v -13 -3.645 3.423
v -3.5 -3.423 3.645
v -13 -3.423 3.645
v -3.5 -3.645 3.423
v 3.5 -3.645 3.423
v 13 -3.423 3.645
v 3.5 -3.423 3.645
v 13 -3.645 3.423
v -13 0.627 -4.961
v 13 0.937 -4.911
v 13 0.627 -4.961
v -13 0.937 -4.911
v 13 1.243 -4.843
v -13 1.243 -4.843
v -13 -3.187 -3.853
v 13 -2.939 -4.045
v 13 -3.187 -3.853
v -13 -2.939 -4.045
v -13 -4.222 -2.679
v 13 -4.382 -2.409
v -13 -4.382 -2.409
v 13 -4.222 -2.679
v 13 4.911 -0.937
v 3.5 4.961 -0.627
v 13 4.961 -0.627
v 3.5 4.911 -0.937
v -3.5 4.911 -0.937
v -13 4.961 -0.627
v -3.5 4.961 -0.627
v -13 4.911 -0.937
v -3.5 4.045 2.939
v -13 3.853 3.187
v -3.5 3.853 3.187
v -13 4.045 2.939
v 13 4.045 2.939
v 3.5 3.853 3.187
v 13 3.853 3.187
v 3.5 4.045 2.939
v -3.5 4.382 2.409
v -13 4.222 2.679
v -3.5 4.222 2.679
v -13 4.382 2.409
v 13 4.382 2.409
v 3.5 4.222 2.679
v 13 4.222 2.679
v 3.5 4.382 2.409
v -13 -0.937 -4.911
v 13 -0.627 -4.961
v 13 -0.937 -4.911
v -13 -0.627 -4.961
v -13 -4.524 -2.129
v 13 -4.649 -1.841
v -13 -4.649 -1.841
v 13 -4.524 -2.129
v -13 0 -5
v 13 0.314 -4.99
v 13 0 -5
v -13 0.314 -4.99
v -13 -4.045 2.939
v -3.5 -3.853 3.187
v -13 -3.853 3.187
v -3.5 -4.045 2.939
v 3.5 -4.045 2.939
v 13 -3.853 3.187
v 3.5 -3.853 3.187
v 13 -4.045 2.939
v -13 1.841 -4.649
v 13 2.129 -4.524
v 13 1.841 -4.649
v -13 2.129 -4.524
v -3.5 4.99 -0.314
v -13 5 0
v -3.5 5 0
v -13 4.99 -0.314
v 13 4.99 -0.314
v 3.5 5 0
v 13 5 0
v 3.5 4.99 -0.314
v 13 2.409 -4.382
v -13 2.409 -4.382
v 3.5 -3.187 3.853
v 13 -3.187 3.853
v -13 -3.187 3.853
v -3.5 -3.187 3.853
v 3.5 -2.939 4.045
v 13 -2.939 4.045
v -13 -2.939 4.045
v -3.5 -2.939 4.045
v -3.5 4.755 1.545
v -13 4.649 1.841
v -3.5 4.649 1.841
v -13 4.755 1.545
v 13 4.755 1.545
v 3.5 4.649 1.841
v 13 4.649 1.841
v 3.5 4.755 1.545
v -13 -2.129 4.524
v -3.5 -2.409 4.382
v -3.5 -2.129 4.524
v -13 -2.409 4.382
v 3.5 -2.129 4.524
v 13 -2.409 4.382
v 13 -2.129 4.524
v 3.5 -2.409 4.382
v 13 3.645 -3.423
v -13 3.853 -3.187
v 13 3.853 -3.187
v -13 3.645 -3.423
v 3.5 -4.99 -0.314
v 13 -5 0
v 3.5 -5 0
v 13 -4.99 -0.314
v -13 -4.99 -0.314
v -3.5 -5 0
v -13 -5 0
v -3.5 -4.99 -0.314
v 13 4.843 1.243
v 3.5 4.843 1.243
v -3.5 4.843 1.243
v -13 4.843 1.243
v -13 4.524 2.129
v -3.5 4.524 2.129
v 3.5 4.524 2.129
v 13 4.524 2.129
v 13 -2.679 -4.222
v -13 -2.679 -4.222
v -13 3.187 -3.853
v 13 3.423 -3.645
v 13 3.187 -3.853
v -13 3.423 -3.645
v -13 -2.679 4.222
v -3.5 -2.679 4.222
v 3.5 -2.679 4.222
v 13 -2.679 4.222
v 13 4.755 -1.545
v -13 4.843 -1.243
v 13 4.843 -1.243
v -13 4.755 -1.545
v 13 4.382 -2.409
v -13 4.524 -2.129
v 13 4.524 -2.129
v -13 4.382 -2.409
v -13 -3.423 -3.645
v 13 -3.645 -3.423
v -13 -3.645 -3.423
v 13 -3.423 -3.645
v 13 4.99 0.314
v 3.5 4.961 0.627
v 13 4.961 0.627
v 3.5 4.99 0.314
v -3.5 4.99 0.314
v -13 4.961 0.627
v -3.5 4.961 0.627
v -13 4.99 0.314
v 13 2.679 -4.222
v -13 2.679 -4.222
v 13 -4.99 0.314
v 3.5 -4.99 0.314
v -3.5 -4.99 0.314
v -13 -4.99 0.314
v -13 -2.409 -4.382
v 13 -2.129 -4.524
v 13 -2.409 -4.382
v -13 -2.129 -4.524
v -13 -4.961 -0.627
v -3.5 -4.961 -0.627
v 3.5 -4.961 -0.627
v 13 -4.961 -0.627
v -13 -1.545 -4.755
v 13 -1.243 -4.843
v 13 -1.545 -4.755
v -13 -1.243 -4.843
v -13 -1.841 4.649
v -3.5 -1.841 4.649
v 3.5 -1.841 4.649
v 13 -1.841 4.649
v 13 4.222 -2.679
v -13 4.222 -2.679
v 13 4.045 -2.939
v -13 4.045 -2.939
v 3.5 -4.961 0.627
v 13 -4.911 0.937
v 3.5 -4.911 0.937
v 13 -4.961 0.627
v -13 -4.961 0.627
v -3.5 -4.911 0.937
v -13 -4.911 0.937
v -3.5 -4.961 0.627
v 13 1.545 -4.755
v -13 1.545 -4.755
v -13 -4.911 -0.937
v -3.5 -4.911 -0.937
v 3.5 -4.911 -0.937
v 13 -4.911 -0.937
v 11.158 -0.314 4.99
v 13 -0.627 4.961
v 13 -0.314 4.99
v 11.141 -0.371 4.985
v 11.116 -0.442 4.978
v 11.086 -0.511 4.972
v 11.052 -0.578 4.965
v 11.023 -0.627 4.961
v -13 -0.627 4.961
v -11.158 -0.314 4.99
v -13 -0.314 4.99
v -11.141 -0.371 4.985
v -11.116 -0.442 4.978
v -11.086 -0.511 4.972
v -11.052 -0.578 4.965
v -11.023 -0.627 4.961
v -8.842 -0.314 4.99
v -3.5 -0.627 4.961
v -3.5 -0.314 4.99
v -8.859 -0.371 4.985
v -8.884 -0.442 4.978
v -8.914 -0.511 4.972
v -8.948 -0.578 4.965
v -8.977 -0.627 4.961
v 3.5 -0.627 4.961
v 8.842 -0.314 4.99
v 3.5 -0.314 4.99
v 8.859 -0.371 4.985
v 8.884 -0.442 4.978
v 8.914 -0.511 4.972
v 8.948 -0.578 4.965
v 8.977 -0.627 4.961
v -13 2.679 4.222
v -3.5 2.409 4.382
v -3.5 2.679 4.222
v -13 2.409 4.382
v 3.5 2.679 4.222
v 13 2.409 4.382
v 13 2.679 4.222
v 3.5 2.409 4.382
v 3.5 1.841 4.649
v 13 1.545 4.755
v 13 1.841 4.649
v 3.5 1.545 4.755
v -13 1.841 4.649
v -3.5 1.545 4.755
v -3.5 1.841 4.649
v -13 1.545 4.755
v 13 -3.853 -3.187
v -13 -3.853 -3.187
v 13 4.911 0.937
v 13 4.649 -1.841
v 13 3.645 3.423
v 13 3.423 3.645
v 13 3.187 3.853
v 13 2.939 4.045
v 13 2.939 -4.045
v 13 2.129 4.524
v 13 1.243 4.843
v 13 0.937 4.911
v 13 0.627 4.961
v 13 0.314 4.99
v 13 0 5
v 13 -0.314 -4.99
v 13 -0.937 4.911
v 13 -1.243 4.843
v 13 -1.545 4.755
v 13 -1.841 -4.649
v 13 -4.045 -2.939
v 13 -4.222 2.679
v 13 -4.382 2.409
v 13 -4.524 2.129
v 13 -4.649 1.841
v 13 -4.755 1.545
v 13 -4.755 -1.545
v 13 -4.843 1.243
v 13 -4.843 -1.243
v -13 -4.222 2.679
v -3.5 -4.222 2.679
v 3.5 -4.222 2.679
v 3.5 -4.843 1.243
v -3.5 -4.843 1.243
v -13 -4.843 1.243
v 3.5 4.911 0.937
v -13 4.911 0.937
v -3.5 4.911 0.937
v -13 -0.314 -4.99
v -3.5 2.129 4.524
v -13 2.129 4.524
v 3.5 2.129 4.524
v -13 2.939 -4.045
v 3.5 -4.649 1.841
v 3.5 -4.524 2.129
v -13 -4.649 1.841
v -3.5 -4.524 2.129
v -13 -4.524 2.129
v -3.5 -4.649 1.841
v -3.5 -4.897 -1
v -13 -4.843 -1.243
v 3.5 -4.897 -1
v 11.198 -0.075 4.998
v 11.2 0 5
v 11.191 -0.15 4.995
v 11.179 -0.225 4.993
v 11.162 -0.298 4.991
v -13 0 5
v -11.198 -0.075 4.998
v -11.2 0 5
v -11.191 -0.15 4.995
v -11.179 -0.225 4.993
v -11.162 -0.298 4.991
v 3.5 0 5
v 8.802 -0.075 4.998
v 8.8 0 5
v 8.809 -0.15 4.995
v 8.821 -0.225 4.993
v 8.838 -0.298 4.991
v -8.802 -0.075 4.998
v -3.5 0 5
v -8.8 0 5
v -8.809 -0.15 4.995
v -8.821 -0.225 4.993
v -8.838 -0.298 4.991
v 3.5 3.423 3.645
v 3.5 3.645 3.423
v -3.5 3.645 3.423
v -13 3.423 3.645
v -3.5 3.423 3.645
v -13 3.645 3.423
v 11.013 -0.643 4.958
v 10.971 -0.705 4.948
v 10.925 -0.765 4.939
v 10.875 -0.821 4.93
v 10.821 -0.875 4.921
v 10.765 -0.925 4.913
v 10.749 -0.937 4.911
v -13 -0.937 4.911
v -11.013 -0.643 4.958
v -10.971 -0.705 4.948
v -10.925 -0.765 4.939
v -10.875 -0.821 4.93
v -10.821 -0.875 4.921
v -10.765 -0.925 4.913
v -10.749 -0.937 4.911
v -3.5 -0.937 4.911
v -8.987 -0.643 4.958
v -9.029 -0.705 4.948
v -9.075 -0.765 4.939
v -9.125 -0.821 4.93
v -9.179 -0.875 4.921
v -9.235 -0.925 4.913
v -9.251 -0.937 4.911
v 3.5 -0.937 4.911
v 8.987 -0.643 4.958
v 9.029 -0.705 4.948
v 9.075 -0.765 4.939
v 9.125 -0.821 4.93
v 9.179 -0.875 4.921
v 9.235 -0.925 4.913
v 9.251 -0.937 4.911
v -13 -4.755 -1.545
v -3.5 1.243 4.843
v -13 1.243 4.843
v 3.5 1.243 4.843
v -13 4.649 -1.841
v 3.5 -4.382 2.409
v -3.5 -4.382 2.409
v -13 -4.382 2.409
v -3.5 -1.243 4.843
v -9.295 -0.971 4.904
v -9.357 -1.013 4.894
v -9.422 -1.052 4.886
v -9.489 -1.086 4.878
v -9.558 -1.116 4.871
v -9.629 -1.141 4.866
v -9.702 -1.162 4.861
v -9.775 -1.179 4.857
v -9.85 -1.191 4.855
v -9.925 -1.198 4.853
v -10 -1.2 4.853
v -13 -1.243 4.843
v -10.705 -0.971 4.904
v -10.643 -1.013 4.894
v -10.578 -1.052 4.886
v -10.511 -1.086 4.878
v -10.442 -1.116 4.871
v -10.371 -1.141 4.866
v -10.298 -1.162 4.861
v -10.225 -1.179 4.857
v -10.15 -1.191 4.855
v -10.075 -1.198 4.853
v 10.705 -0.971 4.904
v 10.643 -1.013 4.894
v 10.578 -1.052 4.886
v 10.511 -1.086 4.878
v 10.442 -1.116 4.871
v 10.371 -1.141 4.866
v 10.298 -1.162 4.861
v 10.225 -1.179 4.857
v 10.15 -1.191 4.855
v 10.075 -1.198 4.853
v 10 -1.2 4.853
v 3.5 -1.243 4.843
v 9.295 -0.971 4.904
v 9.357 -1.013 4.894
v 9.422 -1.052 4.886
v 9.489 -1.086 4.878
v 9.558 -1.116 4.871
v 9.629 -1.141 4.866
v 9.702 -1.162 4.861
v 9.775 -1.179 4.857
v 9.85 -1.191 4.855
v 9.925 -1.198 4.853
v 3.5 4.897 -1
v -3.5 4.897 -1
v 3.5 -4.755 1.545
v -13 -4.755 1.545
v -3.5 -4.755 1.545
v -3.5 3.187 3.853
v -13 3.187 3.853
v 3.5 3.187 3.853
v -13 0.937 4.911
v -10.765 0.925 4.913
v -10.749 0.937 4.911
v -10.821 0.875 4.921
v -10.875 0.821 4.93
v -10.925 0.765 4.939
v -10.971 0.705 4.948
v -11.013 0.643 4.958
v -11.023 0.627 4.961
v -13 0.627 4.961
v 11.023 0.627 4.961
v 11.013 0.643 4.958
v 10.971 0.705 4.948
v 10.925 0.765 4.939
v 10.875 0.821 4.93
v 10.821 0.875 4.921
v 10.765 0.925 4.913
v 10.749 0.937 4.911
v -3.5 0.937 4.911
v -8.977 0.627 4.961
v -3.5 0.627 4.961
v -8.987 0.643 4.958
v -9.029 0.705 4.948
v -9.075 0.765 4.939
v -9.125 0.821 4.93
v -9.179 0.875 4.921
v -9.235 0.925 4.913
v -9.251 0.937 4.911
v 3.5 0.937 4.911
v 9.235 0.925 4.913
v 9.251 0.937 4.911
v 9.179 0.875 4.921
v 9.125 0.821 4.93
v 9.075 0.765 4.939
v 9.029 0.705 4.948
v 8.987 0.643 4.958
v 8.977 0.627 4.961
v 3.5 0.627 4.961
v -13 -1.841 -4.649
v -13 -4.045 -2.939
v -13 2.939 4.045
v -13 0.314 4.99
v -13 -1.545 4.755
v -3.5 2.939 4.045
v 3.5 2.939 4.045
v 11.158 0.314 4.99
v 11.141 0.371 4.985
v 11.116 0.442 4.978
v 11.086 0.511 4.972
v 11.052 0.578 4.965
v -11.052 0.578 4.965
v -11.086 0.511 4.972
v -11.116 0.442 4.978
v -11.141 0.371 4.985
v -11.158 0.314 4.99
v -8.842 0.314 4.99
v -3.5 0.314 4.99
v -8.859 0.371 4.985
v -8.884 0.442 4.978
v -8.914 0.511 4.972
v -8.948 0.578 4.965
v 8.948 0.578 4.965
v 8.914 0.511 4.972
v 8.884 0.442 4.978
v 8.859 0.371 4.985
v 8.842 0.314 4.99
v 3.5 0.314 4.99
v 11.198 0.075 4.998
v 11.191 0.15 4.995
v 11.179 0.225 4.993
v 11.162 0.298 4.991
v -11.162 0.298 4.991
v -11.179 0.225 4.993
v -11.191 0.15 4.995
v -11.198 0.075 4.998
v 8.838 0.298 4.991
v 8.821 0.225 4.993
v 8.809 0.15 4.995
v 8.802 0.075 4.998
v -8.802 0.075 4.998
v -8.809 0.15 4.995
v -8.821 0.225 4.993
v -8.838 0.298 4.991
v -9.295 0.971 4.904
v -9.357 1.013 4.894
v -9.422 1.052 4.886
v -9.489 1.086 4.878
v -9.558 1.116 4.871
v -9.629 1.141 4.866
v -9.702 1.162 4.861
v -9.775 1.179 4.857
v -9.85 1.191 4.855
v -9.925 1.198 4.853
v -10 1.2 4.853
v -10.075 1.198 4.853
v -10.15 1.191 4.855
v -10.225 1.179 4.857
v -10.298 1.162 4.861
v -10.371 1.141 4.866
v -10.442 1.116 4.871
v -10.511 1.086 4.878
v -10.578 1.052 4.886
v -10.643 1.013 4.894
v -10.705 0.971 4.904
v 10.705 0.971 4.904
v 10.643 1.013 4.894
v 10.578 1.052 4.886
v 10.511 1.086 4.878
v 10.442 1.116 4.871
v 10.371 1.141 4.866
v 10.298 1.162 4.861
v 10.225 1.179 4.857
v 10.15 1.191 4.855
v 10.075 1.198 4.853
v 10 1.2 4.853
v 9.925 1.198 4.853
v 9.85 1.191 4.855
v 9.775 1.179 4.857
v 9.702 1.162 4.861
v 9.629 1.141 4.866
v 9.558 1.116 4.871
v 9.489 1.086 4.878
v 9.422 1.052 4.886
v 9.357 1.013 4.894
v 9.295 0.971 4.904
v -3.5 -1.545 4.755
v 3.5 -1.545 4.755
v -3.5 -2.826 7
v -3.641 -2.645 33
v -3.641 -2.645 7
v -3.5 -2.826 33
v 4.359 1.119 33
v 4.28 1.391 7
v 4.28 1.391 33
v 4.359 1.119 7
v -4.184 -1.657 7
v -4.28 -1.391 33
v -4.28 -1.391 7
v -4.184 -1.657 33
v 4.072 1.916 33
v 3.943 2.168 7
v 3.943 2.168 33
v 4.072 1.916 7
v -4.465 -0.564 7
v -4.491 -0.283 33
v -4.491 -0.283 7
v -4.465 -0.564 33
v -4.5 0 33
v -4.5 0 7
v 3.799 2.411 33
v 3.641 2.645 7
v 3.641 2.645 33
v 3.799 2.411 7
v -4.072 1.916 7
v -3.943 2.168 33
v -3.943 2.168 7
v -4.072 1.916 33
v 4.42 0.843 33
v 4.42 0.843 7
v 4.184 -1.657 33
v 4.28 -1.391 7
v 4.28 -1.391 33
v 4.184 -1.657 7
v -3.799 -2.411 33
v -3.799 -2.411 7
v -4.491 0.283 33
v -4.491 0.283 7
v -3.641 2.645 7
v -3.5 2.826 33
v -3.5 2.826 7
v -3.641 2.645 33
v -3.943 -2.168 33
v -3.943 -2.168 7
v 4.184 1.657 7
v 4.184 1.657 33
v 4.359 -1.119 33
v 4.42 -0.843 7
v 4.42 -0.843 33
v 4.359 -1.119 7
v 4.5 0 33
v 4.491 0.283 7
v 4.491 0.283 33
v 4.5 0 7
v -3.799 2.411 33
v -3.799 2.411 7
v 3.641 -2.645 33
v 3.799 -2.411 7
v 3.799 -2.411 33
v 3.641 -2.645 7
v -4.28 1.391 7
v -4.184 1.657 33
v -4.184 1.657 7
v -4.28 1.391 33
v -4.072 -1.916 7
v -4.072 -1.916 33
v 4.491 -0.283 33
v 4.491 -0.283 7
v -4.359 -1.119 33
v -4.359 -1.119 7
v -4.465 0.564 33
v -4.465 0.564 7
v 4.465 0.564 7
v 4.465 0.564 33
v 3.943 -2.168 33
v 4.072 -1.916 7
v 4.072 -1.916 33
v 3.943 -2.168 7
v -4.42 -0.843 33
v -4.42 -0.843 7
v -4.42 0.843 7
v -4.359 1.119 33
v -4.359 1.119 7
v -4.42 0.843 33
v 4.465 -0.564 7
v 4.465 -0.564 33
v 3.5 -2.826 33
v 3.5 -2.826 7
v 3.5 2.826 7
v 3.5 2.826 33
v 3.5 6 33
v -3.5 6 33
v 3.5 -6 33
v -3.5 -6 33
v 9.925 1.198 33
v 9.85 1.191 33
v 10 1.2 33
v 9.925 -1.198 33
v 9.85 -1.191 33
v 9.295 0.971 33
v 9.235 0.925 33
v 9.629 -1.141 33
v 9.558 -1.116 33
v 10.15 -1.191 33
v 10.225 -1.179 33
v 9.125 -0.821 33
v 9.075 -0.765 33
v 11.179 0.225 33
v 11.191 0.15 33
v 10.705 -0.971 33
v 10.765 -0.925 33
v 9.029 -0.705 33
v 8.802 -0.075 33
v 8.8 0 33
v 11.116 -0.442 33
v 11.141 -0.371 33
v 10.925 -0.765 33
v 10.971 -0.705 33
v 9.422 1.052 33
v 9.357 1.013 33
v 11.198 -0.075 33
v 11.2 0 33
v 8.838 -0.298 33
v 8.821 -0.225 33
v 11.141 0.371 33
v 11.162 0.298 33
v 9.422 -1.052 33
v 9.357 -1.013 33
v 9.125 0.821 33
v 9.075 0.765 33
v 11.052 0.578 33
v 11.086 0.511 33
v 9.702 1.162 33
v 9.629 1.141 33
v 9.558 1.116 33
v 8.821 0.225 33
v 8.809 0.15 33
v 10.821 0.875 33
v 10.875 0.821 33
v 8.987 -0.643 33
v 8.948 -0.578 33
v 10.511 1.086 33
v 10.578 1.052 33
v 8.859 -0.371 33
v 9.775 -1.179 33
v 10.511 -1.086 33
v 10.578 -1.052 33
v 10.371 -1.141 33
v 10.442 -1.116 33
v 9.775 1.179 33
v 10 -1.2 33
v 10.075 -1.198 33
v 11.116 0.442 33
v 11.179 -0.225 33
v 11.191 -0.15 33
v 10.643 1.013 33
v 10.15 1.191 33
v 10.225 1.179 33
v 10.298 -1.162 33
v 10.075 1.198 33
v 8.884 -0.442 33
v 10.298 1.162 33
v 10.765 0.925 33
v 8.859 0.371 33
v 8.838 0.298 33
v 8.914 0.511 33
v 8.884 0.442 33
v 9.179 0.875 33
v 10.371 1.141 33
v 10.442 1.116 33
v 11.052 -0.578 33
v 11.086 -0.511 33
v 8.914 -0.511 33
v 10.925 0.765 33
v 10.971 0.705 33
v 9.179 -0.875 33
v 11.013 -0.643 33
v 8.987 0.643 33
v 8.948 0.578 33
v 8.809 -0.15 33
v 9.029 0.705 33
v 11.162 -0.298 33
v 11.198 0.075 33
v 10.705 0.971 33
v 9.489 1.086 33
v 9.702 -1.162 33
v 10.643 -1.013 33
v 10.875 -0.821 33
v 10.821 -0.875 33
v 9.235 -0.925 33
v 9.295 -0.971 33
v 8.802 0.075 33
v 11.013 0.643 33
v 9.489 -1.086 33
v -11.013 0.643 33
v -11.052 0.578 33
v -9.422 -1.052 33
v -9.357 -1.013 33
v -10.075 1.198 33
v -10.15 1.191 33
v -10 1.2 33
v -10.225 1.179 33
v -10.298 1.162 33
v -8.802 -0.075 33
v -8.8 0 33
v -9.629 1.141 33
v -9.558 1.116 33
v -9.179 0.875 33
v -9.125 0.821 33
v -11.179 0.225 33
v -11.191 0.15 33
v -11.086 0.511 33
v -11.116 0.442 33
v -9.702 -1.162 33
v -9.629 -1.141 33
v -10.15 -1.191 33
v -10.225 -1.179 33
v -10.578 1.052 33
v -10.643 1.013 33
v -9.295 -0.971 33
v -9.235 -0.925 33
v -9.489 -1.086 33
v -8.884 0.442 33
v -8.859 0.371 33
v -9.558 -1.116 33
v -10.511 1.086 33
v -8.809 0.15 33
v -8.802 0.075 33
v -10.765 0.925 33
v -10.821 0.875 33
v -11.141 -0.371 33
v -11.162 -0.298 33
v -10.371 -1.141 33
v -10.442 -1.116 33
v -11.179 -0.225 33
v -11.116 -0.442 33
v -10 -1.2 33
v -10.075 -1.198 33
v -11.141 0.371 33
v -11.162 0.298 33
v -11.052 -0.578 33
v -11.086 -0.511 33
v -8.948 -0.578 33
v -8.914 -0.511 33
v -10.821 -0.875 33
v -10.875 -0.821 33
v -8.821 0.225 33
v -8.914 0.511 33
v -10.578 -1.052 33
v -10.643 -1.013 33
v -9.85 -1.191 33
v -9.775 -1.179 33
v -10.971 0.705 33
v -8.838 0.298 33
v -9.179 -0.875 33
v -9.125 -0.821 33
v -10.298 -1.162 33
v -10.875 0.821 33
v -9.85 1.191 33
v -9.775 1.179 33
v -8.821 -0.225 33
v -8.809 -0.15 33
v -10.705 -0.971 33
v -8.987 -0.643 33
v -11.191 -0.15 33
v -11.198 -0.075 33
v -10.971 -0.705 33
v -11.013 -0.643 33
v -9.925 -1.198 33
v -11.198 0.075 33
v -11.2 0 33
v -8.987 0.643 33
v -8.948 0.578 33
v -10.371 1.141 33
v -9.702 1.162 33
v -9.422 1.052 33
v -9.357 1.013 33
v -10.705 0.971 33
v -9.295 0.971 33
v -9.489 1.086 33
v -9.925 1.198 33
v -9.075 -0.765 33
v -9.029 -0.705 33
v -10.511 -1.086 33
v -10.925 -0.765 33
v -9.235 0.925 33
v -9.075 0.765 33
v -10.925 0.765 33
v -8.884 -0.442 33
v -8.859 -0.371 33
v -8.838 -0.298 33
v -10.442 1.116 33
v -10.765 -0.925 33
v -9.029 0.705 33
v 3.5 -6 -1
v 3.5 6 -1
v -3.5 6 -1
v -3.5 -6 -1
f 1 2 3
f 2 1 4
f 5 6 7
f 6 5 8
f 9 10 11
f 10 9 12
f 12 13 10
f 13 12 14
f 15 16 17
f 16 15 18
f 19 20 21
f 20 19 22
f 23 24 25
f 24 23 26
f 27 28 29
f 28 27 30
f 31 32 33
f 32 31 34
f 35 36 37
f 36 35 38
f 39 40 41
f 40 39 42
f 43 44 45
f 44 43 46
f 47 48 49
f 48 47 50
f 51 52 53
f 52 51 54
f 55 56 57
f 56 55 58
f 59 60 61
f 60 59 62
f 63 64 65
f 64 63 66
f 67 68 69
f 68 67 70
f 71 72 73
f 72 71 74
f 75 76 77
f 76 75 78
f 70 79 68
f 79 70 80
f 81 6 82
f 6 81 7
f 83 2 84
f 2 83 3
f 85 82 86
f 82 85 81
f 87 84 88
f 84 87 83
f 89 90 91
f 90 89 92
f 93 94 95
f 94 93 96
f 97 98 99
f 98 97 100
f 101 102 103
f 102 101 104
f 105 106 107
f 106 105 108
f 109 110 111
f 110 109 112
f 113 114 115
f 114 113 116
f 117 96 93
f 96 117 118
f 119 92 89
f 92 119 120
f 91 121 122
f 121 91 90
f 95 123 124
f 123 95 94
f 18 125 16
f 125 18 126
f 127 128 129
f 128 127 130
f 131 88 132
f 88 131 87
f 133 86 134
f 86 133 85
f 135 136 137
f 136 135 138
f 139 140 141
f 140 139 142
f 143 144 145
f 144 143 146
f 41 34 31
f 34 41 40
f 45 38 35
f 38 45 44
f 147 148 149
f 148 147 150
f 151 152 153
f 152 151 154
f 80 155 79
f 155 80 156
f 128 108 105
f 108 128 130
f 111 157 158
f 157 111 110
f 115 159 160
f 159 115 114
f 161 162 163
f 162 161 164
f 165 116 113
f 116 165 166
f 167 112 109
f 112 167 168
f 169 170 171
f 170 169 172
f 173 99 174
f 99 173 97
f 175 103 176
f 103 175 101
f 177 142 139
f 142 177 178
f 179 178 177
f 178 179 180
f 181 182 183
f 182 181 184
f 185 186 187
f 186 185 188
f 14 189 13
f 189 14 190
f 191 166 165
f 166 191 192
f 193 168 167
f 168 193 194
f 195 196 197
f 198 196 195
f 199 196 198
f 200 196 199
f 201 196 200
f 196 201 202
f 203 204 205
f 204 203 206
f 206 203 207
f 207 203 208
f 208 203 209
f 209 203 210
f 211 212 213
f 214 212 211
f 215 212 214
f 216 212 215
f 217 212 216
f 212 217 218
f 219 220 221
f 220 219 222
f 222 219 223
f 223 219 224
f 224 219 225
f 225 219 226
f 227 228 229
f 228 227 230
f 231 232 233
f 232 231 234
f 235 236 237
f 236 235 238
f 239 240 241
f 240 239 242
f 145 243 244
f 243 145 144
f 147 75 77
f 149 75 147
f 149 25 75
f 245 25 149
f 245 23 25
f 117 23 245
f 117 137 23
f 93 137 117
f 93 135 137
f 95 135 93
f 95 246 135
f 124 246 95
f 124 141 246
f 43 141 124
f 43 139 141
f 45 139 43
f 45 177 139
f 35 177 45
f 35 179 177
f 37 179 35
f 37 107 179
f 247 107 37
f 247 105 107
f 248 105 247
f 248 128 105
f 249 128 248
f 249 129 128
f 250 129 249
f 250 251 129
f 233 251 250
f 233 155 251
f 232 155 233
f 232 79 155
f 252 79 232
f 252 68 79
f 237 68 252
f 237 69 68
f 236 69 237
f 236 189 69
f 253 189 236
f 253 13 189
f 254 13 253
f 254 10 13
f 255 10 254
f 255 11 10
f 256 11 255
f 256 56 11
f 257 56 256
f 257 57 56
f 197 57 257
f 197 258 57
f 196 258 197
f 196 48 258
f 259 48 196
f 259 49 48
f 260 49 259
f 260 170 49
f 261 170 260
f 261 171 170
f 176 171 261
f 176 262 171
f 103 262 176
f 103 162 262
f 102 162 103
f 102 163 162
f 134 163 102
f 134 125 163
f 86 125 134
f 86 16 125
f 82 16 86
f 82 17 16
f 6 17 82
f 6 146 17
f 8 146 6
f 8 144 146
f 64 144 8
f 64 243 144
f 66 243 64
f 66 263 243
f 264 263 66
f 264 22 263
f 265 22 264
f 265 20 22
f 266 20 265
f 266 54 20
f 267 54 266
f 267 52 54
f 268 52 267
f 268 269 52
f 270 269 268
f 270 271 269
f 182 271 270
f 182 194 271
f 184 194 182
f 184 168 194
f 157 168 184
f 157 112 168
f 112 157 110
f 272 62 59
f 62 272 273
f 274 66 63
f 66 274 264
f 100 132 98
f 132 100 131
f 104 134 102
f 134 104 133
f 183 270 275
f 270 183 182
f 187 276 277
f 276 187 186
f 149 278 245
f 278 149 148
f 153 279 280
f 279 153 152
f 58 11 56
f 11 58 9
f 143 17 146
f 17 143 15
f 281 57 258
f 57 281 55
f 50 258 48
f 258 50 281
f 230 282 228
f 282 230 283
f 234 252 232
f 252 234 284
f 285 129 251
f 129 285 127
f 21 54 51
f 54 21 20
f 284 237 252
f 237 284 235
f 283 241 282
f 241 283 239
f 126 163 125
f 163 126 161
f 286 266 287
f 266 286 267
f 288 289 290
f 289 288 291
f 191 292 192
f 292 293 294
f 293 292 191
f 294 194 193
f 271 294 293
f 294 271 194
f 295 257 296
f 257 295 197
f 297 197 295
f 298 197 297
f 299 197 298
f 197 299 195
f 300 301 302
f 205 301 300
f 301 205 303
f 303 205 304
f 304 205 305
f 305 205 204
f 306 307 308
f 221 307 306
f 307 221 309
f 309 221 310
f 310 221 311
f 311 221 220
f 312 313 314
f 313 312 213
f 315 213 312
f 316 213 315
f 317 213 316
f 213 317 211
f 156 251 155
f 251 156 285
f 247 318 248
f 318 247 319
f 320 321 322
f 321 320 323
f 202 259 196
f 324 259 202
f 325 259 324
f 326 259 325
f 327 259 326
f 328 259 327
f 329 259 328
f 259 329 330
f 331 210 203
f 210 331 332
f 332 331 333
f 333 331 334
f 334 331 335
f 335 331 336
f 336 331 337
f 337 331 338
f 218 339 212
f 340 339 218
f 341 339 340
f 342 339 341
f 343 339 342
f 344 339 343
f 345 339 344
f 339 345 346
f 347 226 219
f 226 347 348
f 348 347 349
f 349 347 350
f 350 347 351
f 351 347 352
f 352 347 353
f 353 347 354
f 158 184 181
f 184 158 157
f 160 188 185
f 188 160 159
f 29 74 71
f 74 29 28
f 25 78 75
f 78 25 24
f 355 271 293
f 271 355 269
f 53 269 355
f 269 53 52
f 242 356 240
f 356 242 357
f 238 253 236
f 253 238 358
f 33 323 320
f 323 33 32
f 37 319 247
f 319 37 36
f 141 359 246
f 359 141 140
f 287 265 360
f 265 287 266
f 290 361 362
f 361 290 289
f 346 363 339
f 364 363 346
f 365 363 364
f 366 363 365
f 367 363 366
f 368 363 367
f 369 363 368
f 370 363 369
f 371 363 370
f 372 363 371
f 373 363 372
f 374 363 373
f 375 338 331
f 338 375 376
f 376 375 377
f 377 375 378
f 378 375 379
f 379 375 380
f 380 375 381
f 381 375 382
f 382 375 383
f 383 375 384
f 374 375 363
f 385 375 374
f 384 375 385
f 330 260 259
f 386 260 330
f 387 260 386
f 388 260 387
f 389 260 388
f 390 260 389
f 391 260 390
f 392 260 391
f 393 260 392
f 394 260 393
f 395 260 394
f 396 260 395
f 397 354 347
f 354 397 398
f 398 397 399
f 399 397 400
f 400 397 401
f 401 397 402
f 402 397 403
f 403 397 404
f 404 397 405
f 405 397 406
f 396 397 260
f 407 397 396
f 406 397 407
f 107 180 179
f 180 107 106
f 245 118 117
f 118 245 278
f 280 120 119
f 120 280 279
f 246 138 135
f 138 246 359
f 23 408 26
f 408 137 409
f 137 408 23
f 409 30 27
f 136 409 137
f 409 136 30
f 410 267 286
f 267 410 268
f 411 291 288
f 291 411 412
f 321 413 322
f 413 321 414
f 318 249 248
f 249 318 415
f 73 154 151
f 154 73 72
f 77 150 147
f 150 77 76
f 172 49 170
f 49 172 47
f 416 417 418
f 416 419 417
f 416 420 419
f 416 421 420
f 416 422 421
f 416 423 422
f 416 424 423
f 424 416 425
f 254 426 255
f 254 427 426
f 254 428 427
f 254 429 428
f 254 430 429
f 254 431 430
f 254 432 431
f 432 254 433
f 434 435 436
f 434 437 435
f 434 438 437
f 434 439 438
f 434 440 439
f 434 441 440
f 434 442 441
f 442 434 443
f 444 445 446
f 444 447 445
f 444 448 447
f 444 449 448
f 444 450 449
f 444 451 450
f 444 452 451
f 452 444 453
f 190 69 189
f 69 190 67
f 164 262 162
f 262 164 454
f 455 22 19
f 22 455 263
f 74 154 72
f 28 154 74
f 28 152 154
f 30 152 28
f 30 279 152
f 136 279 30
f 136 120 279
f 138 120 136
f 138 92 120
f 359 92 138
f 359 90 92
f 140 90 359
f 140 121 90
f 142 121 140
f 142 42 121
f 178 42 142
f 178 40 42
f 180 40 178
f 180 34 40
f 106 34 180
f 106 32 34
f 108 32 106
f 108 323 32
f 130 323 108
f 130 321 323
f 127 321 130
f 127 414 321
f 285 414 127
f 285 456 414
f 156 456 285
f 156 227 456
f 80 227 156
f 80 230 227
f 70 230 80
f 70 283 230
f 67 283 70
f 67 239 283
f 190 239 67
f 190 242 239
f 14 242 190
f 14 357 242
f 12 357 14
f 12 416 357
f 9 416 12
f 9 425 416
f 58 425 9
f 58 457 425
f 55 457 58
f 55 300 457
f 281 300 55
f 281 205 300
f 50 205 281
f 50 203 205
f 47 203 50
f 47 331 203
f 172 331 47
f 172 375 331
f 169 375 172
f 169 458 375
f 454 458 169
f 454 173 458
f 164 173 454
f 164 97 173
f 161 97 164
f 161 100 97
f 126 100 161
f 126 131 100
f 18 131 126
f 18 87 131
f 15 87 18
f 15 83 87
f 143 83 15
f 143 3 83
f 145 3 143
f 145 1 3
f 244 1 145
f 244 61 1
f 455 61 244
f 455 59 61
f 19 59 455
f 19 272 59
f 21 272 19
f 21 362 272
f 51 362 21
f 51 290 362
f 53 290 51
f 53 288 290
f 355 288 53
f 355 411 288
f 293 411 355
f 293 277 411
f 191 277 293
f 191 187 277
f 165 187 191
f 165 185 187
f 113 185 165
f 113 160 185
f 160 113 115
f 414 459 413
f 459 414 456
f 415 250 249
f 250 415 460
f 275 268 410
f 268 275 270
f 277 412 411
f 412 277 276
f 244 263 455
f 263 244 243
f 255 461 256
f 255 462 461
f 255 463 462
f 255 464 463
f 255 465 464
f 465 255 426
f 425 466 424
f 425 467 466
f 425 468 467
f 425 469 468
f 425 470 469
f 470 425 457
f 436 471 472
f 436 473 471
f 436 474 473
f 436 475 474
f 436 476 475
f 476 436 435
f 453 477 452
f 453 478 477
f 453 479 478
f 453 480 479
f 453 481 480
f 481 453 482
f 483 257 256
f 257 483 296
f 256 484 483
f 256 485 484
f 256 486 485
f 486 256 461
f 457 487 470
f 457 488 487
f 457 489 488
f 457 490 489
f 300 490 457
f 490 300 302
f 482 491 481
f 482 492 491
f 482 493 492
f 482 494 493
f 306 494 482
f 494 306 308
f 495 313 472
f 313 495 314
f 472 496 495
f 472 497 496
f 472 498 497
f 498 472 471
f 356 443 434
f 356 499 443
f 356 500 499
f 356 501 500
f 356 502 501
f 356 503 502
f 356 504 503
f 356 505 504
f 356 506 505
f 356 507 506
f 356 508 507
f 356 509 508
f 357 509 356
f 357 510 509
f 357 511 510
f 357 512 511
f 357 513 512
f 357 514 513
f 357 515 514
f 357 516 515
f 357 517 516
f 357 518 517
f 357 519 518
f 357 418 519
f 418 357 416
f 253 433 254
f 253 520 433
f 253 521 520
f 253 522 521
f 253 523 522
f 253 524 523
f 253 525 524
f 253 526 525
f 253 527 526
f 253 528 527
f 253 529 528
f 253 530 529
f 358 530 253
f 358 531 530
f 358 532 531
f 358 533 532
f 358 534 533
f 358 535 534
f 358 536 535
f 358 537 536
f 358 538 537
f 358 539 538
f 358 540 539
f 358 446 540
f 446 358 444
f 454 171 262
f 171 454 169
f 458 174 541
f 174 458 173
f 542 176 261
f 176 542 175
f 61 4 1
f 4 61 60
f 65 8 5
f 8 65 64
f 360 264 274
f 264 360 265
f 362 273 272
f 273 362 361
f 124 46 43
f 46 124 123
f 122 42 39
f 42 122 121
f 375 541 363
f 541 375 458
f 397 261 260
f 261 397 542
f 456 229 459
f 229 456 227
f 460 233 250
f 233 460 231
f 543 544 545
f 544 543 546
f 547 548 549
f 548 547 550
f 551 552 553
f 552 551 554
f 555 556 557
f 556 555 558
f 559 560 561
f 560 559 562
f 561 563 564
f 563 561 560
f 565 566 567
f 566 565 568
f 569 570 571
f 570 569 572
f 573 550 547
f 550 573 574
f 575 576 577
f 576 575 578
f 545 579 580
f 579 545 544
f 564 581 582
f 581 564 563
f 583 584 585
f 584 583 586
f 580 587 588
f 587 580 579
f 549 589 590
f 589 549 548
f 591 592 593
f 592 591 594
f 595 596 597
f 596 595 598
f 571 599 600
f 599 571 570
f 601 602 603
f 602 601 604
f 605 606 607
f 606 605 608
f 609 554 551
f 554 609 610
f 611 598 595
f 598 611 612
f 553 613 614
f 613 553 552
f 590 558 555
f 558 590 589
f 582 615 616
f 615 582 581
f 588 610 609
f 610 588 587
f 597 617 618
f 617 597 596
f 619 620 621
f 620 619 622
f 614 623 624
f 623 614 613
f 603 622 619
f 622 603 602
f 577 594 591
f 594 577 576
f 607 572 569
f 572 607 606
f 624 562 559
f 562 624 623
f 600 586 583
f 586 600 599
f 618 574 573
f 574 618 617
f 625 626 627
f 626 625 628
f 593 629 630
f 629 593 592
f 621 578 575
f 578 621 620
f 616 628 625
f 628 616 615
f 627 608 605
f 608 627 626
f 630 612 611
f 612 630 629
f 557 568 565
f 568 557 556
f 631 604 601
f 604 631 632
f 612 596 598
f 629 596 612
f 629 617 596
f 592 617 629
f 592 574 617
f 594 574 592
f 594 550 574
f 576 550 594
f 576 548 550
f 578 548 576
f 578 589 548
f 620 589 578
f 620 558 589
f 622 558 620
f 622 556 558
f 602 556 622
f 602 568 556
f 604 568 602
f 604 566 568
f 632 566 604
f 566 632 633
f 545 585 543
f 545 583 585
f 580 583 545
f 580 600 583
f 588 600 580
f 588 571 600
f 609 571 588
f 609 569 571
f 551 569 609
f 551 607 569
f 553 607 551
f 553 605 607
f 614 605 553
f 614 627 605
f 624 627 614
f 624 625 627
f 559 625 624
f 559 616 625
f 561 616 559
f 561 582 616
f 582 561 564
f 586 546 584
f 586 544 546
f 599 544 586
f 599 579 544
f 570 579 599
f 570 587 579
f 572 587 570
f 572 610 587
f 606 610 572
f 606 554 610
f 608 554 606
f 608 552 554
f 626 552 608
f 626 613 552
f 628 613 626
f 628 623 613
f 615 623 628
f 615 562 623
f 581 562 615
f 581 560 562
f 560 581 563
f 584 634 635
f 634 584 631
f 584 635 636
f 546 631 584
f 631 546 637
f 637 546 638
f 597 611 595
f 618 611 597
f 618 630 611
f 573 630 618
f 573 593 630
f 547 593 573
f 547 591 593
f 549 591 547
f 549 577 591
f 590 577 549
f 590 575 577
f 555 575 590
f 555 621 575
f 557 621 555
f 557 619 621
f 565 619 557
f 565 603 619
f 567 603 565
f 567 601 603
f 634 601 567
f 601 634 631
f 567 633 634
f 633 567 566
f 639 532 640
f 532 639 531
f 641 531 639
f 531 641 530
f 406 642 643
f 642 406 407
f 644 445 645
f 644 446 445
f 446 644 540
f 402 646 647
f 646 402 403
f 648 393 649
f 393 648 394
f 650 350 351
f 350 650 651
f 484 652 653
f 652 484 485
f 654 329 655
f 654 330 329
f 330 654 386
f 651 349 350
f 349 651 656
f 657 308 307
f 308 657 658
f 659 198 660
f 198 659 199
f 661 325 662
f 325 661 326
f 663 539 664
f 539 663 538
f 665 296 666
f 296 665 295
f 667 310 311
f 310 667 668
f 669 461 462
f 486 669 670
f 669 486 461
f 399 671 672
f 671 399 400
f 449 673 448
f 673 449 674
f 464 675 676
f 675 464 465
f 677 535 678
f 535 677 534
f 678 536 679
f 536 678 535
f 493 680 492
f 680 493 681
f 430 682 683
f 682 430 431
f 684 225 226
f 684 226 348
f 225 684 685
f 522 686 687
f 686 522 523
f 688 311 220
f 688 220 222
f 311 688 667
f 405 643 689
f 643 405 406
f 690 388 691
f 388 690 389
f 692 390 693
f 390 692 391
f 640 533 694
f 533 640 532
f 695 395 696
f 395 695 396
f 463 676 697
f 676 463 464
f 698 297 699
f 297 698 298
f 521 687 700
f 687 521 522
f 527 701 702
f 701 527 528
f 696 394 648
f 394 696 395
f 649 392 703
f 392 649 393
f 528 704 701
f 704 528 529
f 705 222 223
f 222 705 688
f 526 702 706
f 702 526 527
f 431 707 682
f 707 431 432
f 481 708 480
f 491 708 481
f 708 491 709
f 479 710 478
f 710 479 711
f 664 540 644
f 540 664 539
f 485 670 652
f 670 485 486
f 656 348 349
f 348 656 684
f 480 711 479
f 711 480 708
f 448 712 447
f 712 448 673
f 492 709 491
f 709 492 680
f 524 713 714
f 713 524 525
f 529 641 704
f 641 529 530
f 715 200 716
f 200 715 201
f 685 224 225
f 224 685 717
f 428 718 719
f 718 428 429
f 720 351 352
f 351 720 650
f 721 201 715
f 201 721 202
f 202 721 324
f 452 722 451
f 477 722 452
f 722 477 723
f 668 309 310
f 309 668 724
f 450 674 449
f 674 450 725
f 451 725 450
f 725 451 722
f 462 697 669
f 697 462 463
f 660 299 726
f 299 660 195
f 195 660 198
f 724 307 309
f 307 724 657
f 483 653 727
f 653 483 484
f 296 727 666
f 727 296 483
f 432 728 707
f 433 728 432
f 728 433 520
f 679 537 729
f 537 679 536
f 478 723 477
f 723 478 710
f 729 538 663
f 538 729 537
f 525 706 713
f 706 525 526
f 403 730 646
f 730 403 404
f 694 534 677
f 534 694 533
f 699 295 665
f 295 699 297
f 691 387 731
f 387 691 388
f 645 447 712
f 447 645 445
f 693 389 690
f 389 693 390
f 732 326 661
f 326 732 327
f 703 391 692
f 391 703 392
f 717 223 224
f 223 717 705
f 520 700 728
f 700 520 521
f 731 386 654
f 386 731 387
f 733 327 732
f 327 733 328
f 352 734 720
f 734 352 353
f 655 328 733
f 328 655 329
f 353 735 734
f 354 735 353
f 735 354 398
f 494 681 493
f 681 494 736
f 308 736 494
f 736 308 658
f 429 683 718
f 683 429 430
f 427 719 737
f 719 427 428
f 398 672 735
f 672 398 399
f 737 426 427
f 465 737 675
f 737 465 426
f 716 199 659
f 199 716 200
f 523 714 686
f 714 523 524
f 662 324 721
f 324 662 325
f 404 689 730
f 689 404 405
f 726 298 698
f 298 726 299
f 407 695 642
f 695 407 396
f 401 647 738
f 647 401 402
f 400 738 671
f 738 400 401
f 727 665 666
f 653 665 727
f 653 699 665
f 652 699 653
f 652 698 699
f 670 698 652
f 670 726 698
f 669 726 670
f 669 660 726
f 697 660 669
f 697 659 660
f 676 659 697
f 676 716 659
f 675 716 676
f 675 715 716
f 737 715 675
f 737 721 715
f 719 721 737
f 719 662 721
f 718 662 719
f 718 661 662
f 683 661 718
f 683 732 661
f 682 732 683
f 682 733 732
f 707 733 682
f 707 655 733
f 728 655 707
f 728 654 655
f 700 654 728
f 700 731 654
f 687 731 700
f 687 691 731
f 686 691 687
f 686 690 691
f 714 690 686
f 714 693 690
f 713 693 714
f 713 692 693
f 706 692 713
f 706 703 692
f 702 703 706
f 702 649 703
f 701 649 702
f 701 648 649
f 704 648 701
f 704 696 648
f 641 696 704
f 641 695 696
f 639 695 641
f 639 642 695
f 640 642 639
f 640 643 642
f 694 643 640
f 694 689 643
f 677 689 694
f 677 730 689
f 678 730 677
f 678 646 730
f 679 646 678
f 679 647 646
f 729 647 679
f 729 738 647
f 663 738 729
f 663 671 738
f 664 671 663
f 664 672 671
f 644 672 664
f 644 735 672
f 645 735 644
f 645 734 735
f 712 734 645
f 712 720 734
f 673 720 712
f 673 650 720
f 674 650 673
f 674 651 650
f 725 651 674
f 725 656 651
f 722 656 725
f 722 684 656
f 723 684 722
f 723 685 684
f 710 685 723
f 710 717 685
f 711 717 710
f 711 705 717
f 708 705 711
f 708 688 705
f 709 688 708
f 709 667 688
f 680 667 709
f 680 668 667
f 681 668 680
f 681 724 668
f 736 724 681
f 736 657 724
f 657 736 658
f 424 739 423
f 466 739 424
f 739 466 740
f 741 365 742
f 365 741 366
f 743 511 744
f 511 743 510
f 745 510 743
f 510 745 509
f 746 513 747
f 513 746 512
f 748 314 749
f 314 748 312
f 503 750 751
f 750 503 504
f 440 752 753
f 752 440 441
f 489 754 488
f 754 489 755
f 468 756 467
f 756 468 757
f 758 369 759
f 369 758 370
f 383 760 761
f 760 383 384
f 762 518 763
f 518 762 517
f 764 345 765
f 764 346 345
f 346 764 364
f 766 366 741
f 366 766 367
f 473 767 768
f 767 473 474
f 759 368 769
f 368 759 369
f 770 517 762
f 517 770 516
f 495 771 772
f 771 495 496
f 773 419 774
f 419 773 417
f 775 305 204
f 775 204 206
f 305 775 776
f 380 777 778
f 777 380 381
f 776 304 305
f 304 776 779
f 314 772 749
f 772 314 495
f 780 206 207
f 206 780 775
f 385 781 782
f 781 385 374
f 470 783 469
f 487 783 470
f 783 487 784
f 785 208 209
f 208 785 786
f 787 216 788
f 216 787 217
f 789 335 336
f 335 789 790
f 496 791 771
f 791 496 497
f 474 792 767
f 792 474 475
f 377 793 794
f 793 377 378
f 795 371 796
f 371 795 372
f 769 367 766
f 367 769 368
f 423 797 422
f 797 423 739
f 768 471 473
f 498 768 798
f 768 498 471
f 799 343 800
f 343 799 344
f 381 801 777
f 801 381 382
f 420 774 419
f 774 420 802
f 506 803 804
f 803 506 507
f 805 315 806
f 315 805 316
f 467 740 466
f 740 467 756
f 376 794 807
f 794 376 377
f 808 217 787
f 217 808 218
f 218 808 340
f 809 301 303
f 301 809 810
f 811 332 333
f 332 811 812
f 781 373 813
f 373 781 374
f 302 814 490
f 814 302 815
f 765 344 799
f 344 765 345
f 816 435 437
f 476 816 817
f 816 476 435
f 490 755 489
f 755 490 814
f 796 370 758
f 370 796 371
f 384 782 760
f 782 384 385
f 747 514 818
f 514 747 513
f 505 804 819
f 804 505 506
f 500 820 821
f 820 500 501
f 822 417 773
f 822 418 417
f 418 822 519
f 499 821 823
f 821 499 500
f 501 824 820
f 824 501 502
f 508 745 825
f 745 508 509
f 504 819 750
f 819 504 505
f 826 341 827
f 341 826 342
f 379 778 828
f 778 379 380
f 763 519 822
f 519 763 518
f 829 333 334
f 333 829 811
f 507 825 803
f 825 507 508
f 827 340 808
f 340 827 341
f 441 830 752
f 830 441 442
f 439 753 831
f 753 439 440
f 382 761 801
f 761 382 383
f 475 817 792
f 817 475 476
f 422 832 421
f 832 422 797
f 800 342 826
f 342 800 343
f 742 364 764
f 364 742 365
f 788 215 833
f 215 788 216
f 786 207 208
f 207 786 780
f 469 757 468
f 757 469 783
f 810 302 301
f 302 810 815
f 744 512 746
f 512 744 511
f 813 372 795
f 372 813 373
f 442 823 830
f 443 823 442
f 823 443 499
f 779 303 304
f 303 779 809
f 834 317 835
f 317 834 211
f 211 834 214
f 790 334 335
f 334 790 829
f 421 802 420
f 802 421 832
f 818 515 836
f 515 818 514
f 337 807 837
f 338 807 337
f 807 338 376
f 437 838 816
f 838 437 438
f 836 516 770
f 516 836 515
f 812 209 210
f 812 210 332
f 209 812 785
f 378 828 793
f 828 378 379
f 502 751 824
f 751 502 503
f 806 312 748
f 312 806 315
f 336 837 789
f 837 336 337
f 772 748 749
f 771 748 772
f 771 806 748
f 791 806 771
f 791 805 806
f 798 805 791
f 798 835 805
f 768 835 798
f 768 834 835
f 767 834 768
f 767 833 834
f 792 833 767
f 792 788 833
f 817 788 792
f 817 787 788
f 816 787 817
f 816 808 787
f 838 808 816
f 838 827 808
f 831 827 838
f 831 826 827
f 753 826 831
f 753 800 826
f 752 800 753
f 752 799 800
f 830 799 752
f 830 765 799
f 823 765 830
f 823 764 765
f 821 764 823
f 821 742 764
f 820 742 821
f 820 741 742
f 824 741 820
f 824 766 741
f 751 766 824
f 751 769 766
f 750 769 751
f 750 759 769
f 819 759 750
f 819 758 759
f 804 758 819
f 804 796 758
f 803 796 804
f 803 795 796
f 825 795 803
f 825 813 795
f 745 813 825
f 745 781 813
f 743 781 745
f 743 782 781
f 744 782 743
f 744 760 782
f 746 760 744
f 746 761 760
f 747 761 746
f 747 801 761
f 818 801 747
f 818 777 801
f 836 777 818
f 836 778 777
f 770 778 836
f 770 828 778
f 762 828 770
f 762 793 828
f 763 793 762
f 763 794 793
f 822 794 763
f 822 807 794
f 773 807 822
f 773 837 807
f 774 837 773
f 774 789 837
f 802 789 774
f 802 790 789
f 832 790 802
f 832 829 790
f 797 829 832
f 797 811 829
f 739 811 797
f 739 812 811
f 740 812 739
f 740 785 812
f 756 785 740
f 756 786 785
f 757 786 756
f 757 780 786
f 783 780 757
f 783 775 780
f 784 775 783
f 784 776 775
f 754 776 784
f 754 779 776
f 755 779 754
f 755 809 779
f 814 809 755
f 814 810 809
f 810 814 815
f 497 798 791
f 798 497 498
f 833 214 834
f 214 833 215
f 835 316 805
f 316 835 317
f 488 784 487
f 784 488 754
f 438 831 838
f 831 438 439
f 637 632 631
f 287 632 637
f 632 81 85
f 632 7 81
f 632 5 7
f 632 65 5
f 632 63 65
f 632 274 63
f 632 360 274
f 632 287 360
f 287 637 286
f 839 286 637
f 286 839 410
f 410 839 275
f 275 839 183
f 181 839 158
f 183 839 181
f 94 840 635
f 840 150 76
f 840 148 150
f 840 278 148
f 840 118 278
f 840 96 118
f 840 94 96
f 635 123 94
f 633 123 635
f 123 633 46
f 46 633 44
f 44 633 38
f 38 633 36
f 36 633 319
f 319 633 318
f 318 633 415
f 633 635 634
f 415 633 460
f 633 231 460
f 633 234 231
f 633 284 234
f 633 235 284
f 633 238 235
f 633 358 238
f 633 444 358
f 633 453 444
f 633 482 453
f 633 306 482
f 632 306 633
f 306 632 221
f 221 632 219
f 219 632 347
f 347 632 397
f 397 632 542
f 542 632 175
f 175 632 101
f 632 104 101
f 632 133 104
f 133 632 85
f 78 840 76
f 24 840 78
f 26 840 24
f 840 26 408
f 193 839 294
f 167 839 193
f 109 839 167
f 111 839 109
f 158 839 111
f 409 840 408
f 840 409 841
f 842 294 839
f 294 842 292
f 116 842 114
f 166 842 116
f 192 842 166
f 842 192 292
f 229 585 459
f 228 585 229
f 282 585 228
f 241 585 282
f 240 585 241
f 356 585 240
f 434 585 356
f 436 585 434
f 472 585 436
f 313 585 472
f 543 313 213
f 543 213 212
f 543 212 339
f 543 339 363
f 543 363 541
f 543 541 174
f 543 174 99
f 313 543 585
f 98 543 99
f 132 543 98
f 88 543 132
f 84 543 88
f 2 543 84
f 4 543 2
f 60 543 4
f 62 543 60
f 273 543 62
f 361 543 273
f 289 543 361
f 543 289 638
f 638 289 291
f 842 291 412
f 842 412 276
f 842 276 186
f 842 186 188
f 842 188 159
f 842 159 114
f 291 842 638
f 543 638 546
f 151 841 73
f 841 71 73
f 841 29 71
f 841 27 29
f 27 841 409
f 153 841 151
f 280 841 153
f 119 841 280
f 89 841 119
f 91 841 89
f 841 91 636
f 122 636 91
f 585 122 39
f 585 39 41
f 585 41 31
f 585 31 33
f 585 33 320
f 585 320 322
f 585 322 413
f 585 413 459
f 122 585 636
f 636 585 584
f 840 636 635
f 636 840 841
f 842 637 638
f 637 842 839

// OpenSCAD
translate([0,-7,-7]){


        difference(){
            union(){

                translate([-13,7,7]){
                    rotate([0,90,0]){
                        cylinder(h=26, r=5, $fn=100, center=false);
                    }
                }  


                translate([0,7,14]){
                    rotate([0,0,90]){
                        cylinder(h=40-14, r=4.5, $fn=100, center=false);
                    }
                }  

                translate([10,7,7]){
                    rotate([0,0,90]){
                        cylinder(h=40-7, r=1.2, $fn=100, center=false);
                    }
                }  
                translate([-10,7,7]){
                    rotate([0,0,90]){
                        cylinder(h=40-7, r=1.2, $fn=100, center=false);
                    }
                }  


                translate([-3.5,1,6]){
                    cube([7,12,34], center=false);
                }

            }
            union() {



            }
        }
}
